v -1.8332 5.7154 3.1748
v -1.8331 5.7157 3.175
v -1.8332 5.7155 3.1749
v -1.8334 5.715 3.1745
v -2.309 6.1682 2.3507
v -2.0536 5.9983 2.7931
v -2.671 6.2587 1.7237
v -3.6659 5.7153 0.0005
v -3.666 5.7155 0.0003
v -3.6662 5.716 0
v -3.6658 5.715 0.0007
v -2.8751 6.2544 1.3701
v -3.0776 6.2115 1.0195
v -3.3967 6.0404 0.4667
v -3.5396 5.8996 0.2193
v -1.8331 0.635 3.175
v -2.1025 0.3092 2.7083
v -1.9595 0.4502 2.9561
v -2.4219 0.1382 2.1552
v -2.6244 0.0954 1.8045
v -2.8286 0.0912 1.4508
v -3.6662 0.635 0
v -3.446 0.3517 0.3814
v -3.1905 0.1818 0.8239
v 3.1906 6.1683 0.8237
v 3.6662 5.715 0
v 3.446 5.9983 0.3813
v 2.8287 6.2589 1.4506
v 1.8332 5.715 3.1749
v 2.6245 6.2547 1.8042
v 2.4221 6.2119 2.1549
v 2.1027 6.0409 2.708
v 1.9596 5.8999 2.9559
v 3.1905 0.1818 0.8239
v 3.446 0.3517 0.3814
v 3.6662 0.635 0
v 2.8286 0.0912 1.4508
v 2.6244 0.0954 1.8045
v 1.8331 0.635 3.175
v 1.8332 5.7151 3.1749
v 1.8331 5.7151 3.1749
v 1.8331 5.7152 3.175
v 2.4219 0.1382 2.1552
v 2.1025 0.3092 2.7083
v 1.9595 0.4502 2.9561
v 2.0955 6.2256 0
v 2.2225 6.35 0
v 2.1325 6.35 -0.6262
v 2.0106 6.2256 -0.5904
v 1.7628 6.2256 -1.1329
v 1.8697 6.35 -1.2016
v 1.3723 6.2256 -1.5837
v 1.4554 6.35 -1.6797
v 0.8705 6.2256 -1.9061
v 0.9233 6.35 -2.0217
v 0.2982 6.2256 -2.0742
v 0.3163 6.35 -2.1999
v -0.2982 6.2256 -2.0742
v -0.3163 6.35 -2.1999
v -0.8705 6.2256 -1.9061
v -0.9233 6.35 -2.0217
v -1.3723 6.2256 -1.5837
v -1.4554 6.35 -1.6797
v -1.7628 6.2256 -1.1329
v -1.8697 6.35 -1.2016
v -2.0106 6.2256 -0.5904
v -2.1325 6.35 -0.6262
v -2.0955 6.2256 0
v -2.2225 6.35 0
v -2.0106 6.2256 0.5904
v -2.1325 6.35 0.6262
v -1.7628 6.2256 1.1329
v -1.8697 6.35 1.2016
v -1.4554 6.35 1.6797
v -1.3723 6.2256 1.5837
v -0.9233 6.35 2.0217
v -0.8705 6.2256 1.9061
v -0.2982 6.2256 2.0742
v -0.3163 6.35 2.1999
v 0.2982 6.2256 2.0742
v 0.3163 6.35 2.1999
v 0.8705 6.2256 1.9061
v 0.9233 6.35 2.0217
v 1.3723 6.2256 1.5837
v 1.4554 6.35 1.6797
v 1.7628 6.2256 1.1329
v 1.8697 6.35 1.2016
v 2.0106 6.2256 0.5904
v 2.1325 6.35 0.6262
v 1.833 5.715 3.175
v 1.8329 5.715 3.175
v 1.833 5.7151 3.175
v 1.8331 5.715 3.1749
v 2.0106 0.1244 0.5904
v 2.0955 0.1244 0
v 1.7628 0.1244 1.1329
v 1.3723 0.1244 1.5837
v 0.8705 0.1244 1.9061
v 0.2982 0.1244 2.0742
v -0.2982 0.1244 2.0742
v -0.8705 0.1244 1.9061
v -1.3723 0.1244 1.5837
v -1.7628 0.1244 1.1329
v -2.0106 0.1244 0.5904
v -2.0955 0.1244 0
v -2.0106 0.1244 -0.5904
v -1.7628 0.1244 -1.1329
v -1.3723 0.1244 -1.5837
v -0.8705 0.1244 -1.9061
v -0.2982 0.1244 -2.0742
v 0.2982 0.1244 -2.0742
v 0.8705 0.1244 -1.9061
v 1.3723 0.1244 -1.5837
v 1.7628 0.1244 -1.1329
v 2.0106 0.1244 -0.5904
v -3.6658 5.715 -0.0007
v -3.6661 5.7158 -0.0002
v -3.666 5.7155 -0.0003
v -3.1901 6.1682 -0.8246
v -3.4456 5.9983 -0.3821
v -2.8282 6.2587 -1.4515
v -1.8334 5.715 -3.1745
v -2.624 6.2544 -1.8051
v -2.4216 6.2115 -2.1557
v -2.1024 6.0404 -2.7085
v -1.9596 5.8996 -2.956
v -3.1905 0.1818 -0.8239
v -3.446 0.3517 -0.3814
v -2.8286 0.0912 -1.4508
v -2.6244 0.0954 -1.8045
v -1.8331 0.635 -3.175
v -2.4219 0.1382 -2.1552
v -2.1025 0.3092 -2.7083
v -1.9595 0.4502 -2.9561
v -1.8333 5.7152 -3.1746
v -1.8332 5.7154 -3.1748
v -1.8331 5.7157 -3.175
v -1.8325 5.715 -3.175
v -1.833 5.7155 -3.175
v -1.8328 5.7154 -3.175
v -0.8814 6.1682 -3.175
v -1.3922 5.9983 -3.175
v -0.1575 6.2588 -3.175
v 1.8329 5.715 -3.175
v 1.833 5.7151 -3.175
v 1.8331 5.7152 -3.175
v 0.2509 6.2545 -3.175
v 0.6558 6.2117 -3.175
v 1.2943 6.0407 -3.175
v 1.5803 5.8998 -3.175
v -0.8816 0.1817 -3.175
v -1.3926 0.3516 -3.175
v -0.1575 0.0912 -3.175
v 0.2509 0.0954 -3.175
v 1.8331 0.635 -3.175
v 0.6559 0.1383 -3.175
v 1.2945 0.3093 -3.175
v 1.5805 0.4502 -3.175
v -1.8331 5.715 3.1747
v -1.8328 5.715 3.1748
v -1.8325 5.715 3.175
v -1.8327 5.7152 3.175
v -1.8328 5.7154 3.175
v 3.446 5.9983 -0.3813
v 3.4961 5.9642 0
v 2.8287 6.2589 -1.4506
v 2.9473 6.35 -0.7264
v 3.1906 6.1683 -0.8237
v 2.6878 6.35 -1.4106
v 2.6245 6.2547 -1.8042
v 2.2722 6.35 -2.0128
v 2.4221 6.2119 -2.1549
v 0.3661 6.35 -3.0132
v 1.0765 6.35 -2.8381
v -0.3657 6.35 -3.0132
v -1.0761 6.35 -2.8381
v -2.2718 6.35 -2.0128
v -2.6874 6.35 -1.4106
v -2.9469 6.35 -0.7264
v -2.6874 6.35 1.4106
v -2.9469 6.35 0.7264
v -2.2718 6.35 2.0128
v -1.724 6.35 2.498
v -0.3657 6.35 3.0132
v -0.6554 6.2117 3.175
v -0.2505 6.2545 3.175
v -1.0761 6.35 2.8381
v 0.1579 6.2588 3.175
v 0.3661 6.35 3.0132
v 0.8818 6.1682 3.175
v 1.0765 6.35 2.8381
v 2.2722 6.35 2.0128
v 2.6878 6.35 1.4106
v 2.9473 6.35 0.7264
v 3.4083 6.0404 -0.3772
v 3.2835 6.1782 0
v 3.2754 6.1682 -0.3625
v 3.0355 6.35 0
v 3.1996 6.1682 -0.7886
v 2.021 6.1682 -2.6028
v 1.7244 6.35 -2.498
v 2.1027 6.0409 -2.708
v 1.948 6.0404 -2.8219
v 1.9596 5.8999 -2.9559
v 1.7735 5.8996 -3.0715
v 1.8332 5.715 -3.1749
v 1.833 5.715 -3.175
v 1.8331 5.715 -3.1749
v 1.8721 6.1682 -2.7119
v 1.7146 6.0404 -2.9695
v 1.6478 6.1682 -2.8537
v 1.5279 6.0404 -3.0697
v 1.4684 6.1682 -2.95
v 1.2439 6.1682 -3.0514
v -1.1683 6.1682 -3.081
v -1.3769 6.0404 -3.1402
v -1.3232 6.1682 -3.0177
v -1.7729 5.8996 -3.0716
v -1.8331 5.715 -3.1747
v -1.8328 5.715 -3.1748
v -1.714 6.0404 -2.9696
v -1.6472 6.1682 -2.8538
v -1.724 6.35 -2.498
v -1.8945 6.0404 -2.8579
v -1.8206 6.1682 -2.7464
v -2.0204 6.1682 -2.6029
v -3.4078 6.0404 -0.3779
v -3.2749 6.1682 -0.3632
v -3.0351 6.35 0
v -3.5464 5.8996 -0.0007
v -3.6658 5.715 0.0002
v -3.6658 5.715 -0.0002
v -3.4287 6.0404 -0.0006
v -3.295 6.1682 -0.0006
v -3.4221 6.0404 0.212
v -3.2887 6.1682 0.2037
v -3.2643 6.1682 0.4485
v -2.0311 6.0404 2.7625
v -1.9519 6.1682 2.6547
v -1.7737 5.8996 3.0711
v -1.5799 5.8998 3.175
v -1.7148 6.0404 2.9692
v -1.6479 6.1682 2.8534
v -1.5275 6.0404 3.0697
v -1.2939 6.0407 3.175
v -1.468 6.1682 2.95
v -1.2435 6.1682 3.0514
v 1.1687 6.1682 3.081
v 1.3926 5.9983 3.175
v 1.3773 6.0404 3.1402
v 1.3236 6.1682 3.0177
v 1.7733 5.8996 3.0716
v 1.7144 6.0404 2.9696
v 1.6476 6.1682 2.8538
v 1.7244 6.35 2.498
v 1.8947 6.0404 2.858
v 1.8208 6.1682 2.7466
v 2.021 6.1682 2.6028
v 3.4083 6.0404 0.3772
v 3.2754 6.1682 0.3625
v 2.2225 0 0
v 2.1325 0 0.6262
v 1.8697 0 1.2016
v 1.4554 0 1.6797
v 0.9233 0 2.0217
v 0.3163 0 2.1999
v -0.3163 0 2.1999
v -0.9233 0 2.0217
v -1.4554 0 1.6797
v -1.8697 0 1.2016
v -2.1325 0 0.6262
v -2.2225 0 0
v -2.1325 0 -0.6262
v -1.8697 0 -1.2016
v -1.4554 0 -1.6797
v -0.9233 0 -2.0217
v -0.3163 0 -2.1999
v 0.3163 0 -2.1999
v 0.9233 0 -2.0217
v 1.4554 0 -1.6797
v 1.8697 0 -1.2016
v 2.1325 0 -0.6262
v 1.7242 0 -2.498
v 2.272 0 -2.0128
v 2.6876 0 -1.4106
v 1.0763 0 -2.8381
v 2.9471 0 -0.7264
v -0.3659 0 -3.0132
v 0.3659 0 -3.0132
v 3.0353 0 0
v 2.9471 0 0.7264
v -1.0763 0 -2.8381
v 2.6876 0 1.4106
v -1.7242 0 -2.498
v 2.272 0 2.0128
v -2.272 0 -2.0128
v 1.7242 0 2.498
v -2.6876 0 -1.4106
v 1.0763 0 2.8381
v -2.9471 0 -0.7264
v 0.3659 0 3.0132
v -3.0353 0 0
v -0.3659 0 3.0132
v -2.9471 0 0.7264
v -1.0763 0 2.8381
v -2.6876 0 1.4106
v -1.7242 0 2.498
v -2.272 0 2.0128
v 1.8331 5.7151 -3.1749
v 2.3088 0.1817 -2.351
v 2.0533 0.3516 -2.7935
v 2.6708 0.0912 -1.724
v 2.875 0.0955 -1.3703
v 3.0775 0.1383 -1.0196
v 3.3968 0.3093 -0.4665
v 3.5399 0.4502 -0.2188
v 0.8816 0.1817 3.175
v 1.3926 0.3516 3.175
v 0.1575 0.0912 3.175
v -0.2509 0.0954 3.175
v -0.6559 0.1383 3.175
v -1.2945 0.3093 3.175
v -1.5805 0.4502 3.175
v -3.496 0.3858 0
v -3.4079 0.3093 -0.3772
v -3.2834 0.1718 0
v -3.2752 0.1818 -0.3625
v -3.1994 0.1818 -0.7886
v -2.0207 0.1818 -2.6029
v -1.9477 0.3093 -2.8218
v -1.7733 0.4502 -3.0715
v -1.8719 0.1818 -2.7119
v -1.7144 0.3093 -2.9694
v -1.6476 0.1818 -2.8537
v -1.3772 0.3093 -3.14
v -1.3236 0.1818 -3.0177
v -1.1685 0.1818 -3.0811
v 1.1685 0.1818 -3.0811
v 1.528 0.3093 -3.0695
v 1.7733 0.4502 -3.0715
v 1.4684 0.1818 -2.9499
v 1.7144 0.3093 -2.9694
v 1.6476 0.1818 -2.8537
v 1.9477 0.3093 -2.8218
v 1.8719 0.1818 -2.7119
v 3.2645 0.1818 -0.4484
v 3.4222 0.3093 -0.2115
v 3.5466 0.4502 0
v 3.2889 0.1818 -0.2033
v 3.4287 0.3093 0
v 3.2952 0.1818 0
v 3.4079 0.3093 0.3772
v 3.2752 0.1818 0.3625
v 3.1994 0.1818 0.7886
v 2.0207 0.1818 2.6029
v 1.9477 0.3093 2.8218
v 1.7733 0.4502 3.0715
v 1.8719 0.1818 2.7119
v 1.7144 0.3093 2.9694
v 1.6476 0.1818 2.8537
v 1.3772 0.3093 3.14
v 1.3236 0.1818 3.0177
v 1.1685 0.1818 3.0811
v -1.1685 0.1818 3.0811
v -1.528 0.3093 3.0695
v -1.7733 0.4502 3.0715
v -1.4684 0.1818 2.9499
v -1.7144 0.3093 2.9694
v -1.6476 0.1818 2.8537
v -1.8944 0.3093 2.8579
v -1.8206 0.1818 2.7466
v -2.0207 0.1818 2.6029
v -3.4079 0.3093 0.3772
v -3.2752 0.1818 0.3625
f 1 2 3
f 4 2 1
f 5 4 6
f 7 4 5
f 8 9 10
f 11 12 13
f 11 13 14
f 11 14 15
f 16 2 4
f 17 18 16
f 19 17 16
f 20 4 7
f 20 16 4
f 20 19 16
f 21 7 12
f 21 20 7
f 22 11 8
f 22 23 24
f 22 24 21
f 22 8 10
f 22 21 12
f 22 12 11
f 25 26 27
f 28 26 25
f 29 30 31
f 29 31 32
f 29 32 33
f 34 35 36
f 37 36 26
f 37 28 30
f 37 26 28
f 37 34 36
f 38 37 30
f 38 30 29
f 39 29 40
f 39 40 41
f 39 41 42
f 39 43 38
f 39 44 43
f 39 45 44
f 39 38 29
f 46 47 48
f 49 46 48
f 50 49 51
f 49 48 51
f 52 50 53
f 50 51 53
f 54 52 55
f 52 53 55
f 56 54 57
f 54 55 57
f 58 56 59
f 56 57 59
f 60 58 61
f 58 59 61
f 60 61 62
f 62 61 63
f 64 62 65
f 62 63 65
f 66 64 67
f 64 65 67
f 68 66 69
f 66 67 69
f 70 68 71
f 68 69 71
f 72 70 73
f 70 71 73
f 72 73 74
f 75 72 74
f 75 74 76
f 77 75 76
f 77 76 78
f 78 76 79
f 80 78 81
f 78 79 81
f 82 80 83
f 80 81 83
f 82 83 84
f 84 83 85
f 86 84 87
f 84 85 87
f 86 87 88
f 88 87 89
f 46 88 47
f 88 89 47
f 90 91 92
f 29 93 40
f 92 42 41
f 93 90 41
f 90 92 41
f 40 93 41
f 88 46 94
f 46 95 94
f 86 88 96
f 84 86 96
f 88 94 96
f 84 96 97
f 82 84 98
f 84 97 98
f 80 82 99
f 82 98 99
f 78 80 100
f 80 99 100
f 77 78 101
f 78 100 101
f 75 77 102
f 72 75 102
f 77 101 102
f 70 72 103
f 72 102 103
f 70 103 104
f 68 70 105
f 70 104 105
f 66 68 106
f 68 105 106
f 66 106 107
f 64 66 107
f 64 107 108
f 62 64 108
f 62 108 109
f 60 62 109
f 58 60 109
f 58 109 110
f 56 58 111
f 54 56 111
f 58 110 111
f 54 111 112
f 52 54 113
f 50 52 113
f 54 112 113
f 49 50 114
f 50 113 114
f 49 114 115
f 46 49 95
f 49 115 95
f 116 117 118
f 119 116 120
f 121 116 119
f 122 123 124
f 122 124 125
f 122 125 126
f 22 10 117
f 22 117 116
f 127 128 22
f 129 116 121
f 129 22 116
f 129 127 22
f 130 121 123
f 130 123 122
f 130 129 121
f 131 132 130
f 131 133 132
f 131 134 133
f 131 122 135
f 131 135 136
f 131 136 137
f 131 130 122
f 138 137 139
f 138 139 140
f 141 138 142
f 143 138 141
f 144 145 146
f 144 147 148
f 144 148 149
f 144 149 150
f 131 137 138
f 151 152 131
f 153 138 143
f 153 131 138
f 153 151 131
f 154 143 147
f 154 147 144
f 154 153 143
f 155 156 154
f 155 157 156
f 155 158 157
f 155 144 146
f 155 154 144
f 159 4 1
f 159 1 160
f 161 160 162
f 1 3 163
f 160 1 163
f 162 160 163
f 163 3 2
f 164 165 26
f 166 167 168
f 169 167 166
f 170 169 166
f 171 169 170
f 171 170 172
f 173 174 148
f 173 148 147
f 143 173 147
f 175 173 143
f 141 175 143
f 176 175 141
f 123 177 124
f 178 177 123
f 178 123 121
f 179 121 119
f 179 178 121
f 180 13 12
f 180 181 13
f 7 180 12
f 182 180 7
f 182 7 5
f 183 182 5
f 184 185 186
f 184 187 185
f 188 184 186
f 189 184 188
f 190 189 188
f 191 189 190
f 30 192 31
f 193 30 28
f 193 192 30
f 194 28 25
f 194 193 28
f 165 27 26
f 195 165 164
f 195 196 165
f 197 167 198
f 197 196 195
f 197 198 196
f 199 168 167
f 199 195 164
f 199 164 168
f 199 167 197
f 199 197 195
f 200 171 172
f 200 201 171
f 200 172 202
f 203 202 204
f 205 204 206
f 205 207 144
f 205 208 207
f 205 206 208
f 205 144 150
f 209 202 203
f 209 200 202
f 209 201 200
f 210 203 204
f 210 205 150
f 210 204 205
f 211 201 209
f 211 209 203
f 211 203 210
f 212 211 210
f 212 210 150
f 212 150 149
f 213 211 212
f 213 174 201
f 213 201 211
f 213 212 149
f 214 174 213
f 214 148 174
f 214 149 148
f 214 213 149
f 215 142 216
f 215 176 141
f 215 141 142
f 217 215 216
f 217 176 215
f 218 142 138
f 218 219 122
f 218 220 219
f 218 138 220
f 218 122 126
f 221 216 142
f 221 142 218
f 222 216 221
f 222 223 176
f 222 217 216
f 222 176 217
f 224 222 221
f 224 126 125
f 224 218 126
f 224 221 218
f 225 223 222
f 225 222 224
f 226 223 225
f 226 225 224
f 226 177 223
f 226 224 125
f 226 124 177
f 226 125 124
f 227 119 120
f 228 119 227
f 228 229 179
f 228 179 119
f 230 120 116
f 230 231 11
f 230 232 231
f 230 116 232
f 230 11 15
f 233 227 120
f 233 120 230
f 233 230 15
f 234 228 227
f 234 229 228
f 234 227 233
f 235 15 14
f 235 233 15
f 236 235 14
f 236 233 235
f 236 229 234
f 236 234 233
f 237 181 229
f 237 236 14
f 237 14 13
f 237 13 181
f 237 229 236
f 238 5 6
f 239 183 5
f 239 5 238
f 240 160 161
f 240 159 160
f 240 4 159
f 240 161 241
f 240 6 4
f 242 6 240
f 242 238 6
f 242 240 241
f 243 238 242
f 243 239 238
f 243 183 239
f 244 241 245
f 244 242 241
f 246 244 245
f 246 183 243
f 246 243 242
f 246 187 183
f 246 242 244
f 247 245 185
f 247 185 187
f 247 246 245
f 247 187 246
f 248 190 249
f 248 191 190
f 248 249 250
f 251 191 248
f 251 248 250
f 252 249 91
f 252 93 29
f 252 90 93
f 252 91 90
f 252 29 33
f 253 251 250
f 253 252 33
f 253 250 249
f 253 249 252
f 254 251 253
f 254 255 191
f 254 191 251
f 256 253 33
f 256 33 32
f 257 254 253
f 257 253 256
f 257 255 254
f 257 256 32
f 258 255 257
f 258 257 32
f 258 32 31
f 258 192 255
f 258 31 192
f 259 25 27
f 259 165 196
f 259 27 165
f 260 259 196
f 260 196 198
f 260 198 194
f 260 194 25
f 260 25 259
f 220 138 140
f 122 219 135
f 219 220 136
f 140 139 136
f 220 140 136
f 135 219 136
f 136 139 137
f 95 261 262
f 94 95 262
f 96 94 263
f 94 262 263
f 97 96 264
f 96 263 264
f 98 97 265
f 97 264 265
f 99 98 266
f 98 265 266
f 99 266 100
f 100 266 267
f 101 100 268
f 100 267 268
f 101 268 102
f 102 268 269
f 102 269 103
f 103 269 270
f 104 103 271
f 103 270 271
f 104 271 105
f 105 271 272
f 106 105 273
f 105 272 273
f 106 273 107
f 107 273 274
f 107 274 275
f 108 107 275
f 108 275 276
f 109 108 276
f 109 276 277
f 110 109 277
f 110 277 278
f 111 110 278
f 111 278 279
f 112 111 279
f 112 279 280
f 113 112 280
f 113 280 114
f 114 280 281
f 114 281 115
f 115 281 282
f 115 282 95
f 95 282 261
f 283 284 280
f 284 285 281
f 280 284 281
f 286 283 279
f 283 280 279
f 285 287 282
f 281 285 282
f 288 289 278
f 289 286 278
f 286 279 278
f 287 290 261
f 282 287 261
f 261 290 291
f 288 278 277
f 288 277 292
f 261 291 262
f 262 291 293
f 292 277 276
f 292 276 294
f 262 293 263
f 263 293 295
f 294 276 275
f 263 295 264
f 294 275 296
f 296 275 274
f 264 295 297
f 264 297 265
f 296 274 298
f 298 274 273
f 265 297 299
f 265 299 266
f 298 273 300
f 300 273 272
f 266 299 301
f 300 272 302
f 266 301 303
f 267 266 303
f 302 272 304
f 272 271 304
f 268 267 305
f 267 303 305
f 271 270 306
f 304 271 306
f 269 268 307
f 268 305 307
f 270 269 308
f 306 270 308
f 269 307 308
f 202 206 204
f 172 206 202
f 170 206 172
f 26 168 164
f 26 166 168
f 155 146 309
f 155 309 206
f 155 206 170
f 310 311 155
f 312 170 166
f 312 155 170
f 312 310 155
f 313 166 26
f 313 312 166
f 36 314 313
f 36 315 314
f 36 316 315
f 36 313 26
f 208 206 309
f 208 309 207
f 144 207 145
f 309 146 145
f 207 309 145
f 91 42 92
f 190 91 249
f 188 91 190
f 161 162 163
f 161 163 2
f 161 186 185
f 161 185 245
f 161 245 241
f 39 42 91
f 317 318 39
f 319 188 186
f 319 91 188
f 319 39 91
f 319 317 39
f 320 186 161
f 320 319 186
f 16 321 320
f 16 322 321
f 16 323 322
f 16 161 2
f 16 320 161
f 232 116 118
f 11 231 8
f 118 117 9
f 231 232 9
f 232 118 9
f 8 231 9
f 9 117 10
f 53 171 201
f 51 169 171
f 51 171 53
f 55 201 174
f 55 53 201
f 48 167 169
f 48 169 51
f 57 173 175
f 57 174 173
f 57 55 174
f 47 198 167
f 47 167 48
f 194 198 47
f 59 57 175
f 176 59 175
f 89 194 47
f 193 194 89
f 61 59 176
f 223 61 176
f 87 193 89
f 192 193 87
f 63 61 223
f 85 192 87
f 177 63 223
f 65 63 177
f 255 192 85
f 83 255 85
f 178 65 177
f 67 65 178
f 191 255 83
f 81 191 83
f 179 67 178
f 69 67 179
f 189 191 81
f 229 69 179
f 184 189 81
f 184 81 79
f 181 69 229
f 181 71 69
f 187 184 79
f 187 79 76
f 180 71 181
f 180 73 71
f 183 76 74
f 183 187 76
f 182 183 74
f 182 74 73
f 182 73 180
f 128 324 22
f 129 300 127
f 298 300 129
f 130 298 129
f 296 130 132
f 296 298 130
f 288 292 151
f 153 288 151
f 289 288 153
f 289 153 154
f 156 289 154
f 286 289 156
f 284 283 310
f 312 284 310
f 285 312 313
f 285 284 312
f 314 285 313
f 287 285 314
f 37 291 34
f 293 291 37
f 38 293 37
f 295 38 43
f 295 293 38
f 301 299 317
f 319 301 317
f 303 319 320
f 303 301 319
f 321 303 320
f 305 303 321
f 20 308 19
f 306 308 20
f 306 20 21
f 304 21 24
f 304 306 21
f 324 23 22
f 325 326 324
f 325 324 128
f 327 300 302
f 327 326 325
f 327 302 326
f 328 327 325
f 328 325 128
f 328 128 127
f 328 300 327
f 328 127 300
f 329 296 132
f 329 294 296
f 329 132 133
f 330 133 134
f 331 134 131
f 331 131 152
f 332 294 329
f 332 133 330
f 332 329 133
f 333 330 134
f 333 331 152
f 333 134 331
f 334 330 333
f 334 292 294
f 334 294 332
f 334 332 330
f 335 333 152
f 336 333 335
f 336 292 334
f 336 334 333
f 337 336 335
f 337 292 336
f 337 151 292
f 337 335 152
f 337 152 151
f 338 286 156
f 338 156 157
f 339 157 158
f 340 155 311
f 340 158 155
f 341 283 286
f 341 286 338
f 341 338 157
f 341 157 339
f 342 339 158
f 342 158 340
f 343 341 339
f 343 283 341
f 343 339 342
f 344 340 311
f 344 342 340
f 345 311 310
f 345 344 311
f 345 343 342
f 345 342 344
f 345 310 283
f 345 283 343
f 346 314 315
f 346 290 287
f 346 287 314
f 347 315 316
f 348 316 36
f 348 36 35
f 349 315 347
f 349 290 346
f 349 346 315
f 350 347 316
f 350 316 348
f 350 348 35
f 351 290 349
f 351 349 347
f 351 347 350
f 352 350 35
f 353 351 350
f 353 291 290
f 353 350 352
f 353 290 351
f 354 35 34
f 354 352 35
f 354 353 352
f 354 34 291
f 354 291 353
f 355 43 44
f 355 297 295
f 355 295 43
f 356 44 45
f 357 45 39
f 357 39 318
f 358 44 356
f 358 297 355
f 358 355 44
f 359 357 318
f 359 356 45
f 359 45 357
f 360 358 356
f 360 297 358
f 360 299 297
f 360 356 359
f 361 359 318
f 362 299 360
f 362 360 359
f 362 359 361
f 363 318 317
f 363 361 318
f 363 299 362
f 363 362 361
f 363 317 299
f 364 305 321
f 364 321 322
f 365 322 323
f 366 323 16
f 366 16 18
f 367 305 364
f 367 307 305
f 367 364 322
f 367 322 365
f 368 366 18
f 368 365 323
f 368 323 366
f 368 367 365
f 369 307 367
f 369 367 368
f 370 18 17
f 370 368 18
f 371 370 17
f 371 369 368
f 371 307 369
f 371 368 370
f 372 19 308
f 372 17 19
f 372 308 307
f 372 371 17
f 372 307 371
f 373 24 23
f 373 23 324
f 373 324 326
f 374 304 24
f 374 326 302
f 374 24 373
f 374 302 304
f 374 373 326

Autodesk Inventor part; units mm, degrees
ref_plane "YZ Plane" through (0, 0, 0) normal (1, 0, 0) x (0, 1, 0)
ref_plane "XZ Plane" through (0, 0, 0) normal (0, 1, 0) x (-1, 0, 0)
ref_plane "XY Plane" through (0, 0, 0) normal (0, 0, 1) x (1, 0, 0)
sketch "Sketch1" plane through (0, 0, 0) normal (0, 1, 0) x (-1, 0, 0)
  line L0 (-1.8331, -3.175) -> (-3.6662, 0)
  line L1 (-3.6662, 0) -> (-1.8331, 3.175)
  line L2 (-1.8331, 3.175) -> (1.8331, 3.175)
  line L3 (1.8331, 3.175) -> (3.6662, 0)
  line L4 (3.6662, 0) -> (1.8331, -3.175)
  line L5 (1.8331, -3.175) -> (-1.8331, -3.175)
  point P0 (0, 0)
  point P1 (0, 0)
  dimension "d0" = 6.35
extrude "Body" add sketch "Sketch1" along normal blind 6.35
sketch "Sketch2" plane through (0, 6.35, 0) normal (0, 1, 0) x (1, 0, 0)
  circle A0 centre (0, 0) radius 2.0955
  dimension "d3" = 4.191
extrude "Hole 2" [suppressed]
sketch "Sketch3" plane through (0, 0, 0) normal (0, -1, 0) x (1, 0, 0)
  circle A0 centre (0, 0) radius 2.0955
  dimension "d6" = 4.191
extrude "Hole 1" cut sketch "Sketch3" against normal blind 12.7
chamfer "Hole 2 Chamfer 1" [suppressed]
chamfer "Hole 1 Chamfer 1" distance 0.127 distance2 0.1244 1 edges at (-2.0955, 0, 0) measured on face at (-0.0842, 0, 2.8101)
sketch "Sketch4" plane through (0, 0, 0) normal (0, 0, 1) x (1, 0, 0)
  line L0 (1.8331, 6.35) -> (-1.8331, 6.35) projected
  line L1 (0, 6.35) -> (-3.0353, 6.35)
  line L2 (-3.6662, 6.35) -> (-1.8331, 6.35) projected
  line L3 (-3.6662, 0) -> (-3.6662, 6.35) projected
  arc A0 (-3.0353, 6.35) -> (-3.6662, 5.715) centre (-2.2234, 4.9124) ccw
  line L4 (-3.6662, 5.715) -> (-6.3588, 8.3147)
  line L5 (-6.3588, 8.3147) -> (0, 6.35)
  line L6 (0, 6.35) -> (0, 2.864)
  point P0 (0, 0)
  dimension "d15" = 3.0353
  dimension "d16" = 1.651
  dimension "d17" = 0.635
revolve "Hole 2 Chamfer 2" [suppressed]
sketch "Sketch5" plane through (0, 0, 0) normal (0, 0, 1) x (1, 0, 0)
  line L0 (0, 0) -> (-3.0353, 0)
  line L1 (1.8331, 0) -> (-1.8331, 0) projected
  line L2 (-3.6662, 0) -> (-3.6662, 6.35) projected
  arc A0 (-3.6662, 0.635) -> (-3.0353, 0) centre (-2.2234, 1.4376) ccw
  line L3 (0, 0) -> (0, -2.1986)
  line L4 (-3.6662, 0.635) -> (-4.1154, -0.8715)
  line L5 (-4.1154, -0.8715) -> (0, 0)
  point P0 (-3.6662, 151.765)
  dimension "d19" = 3.0353
  dimension "d20" = 1.651
  dimension "d21" = 0.635
revolve "Hole 1 Chamfer 2" cut sketch "Sketch5" angle 360 about axis through (0, 0, 0) along (0, -1, 0)
chamfer "Hole 2 Chamfer 1 For Short" distance 0.127 distance2 0.1244 1 edges at (-2.0955, 6.35, 0) measured on face at (-0.0842, 6.35, 2.8101)
sketch "Sketch7" plane through (0, 0, 0) normal (0, 0, 1) x (1, 0, 0)
  line L0 (0.0002, 6.3504) -> (3.0355, 6.35)
  line L1 (3.6662, 6.35) -> (1.8331, 6.35) projected
  line L2 (3.6662, 0.635) -> (3.6662, 6.35) projected
  arc A0 (3.6662, 5.715) -> (3.0355, 6.35) centre (2.2233, 4.9126) ccw
  line L3 (3.6662, 5.715) -> (4.2665, 7.2532)
  line L4 (4.2665, 7.2532) -> (0.0002, 6.3504)
  line L5 (0.0002, 8.1561) -> (0.0002, 6.3504)
  line L6 (1.8331, 6.35) -> (-1.8331, 6.35) projected
  point P0 (0, 0)
  dimension "d33" = 3.0353
  dimension "d34" = 1.651
  dimension "d35" = 0.635
revolve "Hole 2 Chamfer 2 For Short" cut sketch "Sketch7" angle 360 about axis through (0.0002, 8.1561, 0) along (0, -1, 0)
properties part number "Standoff .25" material "VEX Aluminum Alloy 5052-H32"
